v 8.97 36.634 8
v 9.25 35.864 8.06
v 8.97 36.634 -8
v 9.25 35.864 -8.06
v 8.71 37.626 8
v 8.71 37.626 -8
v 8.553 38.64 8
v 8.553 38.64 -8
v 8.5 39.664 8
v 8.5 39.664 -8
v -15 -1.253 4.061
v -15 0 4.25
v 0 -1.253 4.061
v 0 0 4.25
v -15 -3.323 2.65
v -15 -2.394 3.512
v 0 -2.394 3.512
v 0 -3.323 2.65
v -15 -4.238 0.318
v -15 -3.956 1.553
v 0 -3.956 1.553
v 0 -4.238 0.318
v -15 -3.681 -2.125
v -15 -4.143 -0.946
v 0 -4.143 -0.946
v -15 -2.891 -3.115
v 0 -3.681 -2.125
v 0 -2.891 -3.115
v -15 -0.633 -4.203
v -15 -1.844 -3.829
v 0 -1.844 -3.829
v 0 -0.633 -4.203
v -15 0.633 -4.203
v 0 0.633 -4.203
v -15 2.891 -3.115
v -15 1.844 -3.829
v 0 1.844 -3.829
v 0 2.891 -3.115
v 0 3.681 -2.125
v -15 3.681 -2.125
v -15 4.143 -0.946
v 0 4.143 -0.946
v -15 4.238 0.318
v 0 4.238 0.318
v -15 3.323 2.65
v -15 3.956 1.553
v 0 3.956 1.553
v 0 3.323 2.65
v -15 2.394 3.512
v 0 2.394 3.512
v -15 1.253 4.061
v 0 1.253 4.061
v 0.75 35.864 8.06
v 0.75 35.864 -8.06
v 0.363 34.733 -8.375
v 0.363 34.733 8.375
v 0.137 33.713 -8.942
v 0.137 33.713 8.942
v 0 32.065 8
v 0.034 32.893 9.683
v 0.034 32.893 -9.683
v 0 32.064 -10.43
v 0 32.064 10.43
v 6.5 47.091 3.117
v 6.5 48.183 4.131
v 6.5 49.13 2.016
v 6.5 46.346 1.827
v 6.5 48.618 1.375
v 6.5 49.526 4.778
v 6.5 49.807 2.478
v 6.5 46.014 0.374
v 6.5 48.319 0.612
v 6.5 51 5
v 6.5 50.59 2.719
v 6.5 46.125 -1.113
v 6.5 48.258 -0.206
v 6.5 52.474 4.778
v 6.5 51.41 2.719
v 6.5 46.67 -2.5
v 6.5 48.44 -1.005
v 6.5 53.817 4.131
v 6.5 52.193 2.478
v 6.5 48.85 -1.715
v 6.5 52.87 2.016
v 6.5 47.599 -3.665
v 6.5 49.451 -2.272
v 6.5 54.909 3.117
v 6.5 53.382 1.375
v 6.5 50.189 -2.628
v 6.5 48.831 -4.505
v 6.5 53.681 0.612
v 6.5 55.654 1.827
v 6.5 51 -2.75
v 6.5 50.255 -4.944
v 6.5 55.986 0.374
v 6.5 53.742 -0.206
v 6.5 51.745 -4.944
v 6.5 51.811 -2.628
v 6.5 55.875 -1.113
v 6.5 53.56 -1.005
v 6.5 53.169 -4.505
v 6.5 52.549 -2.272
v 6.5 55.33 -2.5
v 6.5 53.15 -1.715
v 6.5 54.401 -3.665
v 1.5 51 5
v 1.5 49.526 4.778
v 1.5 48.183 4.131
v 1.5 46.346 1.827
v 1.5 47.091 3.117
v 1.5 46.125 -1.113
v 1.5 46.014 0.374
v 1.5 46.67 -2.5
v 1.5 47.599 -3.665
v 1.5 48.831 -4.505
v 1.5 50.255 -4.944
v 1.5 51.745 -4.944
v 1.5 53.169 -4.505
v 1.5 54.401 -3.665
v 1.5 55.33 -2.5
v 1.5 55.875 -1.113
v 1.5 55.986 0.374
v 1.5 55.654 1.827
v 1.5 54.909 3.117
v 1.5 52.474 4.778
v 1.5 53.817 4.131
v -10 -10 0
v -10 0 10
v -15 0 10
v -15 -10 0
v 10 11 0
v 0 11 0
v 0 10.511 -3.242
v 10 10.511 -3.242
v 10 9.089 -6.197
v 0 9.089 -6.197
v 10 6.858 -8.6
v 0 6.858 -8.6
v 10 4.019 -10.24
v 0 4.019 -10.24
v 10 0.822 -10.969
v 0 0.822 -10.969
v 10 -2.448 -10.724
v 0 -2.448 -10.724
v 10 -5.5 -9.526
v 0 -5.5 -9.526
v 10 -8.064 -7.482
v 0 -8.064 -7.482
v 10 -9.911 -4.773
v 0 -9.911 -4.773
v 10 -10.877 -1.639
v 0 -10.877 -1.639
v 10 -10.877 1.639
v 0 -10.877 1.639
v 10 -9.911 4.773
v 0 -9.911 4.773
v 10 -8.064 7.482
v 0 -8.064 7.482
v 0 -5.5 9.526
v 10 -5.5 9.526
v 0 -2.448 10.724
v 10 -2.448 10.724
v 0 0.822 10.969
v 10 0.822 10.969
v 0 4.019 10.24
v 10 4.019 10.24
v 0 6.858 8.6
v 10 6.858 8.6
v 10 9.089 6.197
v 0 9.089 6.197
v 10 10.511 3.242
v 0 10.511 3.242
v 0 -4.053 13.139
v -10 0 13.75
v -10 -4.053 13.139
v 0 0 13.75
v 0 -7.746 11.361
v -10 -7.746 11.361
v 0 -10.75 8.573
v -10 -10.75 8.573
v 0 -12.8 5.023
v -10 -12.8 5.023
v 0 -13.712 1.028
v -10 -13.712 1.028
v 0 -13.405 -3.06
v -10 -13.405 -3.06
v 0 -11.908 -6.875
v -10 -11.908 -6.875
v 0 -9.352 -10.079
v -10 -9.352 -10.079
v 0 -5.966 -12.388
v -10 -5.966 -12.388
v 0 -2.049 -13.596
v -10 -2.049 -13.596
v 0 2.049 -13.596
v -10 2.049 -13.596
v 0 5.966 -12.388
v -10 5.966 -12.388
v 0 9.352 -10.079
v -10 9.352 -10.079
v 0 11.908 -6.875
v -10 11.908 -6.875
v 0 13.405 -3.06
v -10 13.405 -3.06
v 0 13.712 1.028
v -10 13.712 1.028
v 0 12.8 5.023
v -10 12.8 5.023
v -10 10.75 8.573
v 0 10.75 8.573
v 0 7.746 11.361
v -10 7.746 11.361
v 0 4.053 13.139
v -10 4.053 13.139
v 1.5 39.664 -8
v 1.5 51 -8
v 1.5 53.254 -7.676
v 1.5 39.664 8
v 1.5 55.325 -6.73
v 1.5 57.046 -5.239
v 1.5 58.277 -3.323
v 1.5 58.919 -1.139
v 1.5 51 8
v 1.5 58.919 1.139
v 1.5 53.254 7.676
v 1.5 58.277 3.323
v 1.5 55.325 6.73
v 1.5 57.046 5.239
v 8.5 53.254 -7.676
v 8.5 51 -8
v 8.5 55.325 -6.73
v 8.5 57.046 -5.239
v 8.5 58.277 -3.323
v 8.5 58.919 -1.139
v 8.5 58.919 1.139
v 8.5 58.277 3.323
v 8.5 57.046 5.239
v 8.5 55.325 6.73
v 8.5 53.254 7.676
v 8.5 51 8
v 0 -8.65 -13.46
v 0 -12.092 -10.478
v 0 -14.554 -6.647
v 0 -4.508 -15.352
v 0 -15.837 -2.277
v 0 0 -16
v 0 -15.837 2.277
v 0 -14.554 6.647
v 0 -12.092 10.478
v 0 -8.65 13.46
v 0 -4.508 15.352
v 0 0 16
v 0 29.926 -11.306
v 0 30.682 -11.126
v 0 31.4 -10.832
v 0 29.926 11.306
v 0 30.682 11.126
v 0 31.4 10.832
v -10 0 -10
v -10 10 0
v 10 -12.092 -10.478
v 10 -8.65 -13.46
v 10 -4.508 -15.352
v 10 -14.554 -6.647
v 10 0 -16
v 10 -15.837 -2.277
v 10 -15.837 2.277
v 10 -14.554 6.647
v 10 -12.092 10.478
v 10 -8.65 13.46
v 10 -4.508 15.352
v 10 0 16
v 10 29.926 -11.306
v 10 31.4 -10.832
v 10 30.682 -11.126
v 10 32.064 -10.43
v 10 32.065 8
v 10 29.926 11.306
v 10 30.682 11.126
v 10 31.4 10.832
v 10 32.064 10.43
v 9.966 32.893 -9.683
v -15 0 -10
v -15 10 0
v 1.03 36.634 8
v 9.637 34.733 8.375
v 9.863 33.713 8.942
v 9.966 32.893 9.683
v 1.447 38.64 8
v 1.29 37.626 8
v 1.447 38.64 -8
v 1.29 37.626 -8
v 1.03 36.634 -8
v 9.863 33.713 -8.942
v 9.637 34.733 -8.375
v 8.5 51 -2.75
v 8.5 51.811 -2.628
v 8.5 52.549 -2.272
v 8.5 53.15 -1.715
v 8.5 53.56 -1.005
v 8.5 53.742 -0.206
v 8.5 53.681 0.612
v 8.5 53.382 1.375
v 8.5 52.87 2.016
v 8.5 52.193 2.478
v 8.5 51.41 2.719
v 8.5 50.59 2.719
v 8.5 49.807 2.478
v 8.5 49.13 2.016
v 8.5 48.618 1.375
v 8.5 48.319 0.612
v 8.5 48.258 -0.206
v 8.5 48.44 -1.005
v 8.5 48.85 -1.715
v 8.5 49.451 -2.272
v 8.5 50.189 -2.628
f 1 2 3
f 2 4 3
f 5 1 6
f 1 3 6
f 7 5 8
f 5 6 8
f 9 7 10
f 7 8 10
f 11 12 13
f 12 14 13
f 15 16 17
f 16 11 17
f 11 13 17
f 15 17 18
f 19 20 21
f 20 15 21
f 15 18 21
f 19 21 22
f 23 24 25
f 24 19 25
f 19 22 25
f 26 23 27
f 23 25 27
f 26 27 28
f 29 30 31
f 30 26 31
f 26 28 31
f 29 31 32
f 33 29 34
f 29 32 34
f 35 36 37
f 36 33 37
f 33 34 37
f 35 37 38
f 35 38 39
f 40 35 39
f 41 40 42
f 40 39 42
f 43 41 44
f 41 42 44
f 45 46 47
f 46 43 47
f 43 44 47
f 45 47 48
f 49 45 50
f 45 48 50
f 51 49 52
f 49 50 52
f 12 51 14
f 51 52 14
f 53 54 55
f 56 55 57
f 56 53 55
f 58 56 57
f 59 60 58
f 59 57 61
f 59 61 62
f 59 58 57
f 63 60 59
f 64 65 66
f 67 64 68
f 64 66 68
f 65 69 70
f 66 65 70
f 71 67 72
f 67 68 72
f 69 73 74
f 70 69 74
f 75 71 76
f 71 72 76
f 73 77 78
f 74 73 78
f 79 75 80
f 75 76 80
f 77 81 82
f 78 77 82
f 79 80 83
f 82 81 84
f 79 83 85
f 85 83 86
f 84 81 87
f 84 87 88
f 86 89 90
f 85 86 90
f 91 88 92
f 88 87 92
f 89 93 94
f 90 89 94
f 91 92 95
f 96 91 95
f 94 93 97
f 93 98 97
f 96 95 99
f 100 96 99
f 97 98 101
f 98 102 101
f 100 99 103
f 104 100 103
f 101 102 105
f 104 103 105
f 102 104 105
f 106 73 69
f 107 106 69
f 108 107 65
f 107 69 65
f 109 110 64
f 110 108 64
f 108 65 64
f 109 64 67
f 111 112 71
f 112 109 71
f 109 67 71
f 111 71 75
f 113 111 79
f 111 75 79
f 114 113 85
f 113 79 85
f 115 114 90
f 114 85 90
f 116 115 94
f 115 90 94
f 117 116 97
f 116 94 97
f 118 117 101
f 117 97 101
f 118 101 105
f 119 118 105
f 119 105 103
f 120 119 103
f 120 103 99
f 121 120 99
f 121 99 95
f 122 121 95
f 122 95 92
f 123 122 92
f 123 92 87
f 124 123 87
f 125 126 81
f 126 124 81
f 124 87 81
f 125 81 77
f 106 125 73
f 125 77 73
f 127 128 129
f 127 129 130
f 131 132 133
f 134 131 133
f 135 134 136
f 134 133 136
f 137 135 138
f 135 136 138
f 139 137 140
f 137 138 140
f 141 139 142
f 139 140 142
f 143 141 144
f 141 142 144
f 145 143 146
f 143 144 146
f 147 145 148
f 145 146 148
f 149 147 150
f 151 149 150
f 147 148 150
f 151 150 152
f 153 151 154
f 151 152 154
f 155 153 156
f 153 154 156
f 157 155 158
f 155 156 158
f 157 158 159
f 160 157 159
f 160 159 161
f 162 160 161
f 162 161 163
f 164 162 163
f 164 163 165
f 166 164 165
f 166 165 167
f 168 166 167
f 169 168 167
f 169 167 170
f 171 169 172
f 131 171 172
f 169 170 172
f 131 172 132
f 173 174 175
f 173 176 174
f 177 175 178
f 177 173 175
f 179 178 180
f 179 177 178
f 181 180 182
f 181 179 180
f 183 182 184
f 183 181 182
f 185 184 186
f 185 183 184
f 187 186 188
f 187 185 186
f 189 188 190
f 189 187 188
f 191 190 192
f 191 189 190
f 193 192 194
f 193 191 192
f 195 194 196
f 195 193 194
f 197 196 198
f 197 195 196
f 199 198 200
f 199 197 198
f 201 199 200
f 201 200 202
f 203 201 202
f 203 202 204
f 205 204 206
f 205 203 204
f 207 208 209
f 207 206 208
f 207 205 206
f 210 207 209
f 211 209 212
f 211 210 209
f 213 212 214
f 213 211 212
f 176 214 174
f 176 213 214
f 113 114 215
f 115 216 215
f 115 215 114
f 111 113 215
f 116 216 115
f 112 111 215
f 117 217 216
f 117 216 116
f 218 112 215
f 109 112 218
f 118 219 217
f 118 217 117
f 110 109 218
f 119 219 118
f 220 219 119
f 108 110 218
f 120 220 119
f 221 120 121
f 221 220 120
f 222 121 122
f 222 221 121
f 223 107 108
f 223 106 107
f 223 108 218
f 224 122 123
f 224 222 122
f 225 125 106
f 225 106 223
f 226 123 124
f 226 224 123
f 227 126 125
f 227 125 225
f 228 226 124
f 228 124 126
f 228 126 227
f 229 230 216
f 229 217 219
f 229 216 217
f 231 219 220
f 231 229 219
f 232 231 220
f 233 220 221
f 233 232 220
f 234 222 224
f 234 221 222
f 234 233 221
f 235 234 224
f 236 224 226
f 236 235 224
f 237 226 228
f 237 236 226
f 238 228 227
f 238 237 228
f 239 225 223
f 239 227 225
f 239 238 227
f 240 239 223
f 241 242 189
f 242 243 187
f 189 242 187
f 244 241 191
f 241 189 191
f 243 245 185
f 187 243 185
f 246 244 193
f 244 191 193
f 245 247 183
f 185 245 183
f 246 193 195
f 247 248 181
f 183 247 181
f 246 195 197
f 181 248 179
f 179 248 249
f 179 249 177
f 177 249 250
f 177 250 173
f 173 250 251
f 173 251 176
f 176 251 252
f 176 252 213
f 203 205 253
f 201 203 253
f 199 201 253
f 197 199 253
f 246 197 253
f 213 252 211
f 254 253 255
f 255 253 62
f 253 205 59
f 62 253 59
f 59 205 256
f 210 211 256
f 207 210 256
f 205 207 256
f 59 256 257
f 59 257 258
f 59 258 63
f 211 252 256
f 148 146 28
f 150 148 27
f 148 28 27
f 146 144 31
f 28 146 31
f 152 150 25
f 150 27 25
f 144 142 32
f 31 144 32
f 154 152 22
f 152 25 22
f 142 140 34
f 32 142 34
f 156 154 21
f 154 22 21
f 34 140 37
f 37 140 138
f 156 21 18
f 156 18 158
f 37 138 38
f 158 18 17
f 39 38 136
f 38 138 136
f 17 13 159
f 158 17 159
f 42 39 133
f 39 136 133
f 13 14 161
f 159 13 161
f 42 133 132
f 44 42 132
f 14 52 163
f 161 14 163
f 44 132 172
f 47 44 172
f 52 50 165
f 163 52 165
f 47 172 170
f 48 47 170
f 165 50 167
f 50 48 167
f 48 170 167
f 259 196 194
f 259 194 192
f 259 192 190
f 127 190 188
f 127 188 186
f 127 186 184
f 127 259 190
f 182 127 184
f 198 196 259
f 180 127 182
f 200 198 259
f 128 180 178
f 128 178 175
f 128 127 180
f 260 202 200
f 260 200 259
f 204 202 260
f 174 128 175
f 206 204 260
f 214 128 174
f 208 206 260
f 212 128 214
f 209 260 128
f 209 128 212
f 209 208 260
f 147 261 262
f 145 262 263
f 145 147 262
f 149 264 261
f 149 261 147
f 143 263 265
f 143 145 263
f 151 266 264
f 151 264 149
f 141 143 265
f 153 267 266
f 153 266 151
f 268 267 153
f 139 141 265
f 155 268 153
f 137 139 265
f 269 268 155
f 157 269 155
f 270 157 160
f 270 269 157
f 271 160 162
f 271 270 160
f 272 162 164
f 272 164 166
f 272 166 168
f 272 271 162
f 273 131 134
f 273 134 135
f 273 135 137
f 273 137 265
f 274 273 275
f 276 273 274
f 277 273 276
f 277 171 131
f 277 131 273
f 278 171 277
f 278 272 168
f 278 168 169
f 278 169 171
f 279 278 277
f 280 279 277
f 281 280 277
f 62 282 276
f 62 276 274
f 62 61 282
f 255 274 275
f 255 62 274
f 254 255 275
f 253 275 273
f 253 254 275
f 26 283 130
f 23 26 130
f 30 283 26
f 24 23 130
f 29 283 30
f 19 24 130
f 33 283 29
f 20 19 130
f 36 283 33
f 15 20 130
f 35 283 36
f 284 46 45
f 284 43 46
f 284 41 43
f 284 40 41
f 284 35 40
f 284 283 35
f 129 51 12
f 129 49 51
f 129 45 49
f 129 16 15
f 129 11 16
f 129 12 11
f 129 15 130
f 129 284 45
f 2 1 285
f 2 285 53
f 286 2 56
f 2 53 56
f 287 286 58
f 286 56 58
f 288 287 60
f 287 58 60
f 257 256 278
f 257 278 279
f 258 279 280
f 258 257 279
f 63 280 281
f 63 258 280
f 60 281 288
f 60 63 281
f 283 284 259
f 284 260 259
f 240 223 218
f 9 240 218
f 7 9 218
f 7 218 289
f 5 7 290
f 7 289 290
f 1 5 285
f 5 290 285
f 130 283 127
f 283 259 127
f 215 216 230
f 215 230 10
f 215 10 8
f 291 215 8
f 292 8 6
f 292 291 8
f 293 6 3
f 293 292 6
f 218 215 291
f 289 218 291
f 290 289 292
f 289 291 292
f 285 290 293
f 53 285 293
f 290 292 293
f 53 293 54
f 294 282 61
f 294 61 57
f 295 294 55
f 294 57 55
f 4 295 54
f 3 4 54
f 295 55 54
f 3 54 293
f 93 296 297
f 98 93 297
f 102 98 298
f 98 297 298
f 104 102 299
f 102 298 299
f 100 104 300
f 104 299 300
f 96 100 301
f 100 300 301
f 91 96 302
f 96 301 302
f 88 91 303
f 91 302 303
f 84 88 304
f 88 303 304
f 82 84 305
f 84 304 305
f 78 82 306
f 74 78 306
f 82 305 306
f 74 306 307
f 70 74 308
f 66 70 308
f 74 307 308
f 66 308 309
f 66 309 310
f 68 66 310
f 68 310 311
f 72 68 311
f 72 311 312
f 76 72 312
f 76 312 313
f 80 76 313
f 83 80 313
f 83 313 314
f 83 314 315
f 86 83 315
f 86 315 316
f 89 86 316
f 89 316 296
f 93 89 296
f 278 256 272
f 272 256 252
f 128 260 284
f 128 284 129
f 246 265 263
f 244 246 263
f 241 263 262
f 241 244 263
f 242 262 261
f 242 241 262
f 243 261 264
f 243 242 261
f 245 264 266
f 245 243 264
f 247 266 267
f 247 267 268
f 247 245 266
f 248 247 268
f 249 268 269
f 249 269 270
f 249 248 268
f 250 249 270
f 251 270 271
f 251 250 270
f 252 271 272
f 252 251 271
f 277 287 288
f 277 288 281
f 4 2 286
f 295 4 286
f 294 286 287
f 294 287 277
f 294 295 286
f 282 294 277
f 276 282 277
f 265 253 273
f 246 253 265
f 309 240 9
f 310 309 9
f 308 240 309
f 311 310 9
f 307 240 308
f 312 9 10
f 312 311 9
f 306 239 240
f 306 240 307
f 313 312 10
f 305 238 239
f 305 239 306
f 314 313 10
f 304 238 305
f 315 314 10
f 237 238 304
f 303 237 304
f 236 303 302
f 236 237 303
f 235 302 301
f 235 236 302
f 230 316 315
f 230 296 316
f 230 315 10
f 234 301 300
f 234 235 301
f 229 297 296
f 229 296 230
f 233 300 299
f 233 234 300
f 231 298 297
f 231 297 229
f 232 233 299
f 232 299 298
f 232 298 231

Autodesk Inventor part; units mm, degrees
ref_plane "YZ Plane" through (0, 0, 0) normal (1, 0, 0) x (0, 1, 0)
ref_plane "XZ Plane" through (0, 0, 0) normal (0, 1, 0) x (-1, 0, 0)
sketch "Esquisse1" plane through (0, 0, 0) normal (1, 0, 0) x (0, 1, 0)
  circle A0 centre (0, 0) radius 16
  line L0 (-16, 0) -> (59, 0)
  line L1 (59, 0) -> (51, 0)
  circle A1 centre (51, 0) radius 5
  circle A2 centre (51, 0) radius 8
  line L2 (0, 16) -> (51, 8)
  line L3 (51, -8) -> (0, -16)
  circle A3 centre (0, 0) radius 11
  line L4 (34.396, -10.6045) -> (34.396, 10.6045)
  dimension "d0" = 32
  dimension "d1" = 75
  dimension "d2" = 8
  dimension "d3" = 10
  dimension "d4" = 16
  dimension "d5" = 22
extrude "Extrusion1" add sketch "Esquisse1" along normal blind 10 contours L2 A0 L0 A3 | L0 A3 A0 L3 | L2 L4 L0 A0 | L0 L4 L3 A0
sketch "Esquisse2" plane through (0, 0, 0) normal (-1, 0, 0) x (0, 0, 1)
  circle A0 centre (0, 0) radius 11
  circle A1 centre (0, 0) radius 4.25
  dimension "d8" = 8.5
extrude "Extrusion2" add sketch "Esquisse2" along normal blind 10
sketch "Esquisse3" plane through (-10, 0, 0) normal (-1, 0, 0) x (0, 0, 1)
  line L0 (0, 0) -> (-10, 0)
  circle A0 centre (0, 0) radius 11 projected
  line L1 (0, 0) -> (0, 10)
  circle A1 centre (0, 0) radius 4.25 projected
  line L2 (0, 0) -> (10, 0)
  line L3 (0, 0) -> (0, -10)
  line L4 (0, 10) -> (-10, 0)
  line L5 (0, 10) -> (10, 0)
  line L6 (10, 0) -> (0, -10)
  line L7 (-10, 0) -> (0, -10)
  circle A2 centre (0, 0) radius 4.25
  dimension "d12" = 10
  dimension "d13" = 10
  dimension "d14" = 10
  dimension "d15" = 10
  dimension "d16" = 8.5
extrude "Extrusion3" add sketch "Esquisse3" along normal blind 5 contours A1 L3 L7 L0 | L0 L4 L1 A1 | L1 L5 L2 A1 | L2 L6 L3 A1
sketch "Esquisse4" plane through (0, 0, 0) normal (-1, 0, 0) x (0, 0, 1)
  circle A0 centre (0, 0) radius 13.75
  circle A1 centre (0, 0) radius 11
  dimension "d19" = 27.5
extrude "Extrusion4" add sketch "Esquisse4" along normal up to surface (10 mm away)
ref_plane "Plan de construction1" through (5, 0, 0) normal (-1, 0, 0) x (0, 0, 1)
sketch "Esquisse7" plane through (5, 0, 0) normal (-1, 0, 0) x (0, 0, 1)
  point P0 (0, 0)
sketch "Esquisse8" plane through (5, 0, 0) normal (-1, 0, 0) x (0, 0, 1)
  circle A0 centre (0, 51) radius 5 projected
  circle A1 centre (0, 51) radius 4.25 projected
  line L0 (-16, 0) -> (-10.6045, 34.396) projected
  line L1 (10.6045, 34.396) -> (16, 0) projected
  arc A2 (8, 51) -> (-8, 51) centre (0, 51) ccw projected
  line L2 (-10.6045, 34.396) -> (10.6045, 34.396) projected
  line L3 (-10.6045, 34.396) -> (-8, 51)
  line L4 (8, 51) -> (10.6045, 34.396)
  line L5 (10.6045, 34.396) -> (-10.6045, 34.396)
  point P0 (0, 0)
extrude "Extrusion6" add sketch "Esquisse8" along normal mid plane 7 contours L4 L2 L3 A2
sketch "Esquisse9" plane through (8.5, 0, 0) normal (1, 0, 0) x (0, 0, -1)
  circle A0 centre (0, 51) radius 5 projected
  circle A1 centre (0, 51) radius 2.75
  circle A2 centre (0, 51) radius 5
  point P0 (0, 0)
  dimension "d37" = 5.5
extrude "Extrusion7" add sketch "Esquisse9" against normal blind 2
fillet "Congé1" radius 10 4 edges at (8.5, 34.396, 0) (1.5, 34.396, 0) (10, 34.396, 0) (0, 34.396, 0)
sketch "Esquisse10" plane through (0, 0, 0) normal (-1, 0, 0) x (0, 0, 1)
  line L0 (-10.9703, 32.0645) -> (10.9703, 32.0645) projected
  line L1 (-10.9703, 32.0645) -> (10.9703, 32.0645)
  arc A0 (8, 51) -> (-8, 51) centre (0, 51) ccw projected
  line L2 (-8, 51) -> (-8, 32.0645)
  line L3 (9.7782, 39.6638) -> (8, 51) projected
  line L4 (8, 51) -> (8, 32.0645)
  arc A1 (8, 51) -> (-8, 51) centre (0, 51) ccw
  line L5 (-10.9703, 32.0645) -> (-8, 51)
  line L6 (8, 51) -> (10.9703, 32.0645)
  point P0 (0, 0)
extrude "Extrusion8" cut sketch "Esquisse10" against normal blind 10 contours L5 L2 L0 | L4 L3 L6 L0
fillet "Congé2" radius 5 2 edges at (5, 32.0645, -8) (5, 32.0645, -10.9703)
fillet "Congé3" radius 5 2 edges at (5, 32.0645, 10.9703) (5, 32.0645, 8)
properties part number "bièlle côté"
